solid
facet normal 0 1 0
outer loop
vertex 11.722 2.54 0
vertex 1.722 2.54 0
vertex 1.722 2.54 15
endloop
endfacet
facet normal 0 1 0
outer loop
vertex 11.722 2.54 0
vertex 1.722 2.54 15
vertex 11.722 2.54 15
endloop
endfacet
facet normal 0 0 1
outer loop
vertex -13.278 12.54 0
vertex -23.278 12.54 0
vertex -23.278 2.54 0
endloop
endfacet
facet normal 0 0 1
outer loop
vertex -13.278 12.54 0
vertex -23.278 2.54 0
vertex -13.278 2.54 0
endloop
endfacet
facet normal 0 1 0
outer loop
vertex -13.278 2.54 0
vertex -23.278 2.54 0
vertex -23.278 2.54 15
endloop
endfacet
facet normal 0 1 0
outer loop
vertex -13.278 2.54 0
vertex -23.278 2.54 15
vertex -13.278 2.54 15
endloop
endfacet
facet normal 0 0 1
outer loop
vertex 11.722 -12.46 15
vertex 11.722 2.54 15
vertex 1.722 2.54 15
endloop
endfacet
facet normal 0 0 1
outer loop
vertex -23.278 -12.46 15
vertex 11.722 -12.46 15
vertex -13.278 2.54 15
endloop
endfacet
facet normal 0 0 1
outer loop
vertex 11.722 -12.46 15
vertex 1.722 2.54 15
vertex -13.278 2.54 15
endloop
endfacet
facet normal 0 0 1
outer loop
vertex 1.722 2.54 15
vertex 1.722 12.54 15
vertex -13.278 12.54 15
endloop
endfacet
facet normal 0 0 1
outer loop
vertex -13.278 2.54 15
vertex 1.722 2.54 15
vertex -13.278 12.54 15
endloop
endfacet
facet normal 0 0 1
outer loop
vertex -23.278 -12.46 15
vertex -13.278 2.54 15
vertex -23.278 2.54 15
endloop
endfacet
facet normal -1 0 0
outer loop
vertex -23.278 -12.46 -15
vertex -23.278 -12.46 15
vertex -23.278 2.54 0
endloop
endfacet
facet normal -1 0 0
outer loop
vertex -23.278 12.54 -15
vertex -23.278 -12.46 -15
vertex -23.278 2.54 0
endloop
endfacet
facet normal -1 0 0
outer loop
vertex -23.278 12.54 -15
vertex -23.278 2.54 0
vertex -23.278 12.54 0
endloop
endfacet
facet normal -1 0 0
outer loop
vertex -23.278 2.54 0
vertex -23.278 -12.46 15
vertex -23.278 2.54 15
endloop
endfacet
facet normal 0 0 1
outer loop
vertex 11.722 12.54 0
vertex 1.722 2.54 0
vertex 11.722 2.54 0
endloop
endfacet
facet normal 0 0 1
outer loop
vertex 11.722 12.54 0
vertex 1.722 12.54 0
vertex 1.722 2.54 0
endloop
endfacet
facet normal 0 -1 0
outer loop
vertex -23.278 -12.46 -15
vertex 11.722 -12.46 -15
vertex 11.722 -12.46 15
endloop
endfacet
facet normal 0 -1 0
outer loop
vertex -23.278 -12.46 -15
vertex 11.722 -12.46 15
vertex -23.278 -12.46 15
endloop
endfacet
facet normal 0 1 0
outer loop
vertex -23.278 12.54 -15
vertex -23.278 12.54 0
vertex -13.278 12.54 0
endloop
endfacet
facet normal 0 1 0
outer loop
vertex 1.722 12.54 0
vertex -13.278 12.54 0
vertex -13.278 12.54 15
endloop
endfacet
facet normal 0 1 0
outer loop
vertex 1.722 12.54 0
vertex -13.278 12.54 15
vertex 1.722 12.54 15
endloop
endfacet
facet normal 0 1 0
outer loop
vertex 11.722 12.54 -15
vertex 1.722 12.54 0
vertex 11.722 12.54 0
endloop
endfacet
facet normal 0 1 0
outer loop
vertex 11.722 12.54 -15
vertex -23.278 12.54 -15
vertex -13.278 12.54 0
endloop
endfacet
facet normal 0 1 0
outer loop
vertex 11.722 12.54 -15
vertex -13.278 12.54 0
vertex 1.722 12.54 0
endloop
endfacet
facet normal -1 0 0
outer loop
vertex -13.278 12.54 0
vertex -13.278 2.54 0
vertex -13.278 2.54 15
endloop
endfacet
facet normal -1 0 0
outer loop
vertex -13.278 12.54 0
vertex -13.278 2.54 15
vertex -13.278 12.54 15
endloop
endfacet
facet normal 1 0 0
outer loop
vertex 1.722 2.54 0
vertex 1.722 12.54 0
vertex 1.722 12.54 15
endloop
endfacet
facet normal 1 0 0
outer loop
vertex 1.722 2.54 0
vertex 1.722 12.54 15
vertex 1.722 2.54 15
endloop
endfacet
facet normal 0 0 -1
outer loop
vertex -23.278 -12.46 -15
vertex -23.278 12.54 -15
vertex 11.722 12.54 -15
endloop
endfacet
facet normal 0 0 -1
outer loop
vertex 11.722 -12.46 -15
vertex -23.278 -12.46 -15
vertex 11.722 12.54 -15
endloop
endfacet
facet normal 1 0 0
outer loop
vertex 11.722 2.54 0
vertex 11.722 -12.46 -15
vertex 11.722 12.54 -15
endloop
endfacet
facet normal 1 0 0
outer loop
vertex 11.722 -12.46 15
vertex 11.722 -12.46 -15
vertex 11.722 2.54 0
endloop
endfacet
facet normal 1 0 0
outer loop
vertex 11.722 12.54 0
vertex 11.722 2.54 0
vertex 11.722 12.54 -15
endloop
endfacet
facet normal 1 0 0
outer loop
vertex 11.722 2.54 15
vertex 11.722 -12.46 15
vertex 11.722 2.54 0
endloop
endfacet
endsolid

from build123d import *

# Parameters (mm, degrees)
SKETCH1_W           = 35
SKETCH1_H           = 25
BOSS_EXTRUDE1_DEPTH = 15
BOSS_EXTRUDE2_DEPTH = 15


with BuildPart() as part:
    # Sketch1 → Boss-Extrude1 (new body)
    with BuildSketch(Plane.XY):
        with Locations((-5.777889773, 0.039936102)):
            Rectangle(SKETCH1_W, SKETCH1_H)
    extrude(amount=-BOSS_EXTRUDE1_DEPTH)

    # Sketch2 → Boss-Extrude2 (add)
    with BuildSketch(Plane.XY):
        Polygon((-13.277889773, 12.539936102), (1.722110227, 12.539936102), (1.722110227, 2.539936102), (11.722110227, 2.539936102), (11.722110227, -12.460063898), (-23.277889773, -12.460063898), (-23.277889773, 2.539936102), (-13.277889773, 2.539936102), align=None)
    extrude(amount=BOSS_EXTRUDE2_DEPTH)


solid = part.part
